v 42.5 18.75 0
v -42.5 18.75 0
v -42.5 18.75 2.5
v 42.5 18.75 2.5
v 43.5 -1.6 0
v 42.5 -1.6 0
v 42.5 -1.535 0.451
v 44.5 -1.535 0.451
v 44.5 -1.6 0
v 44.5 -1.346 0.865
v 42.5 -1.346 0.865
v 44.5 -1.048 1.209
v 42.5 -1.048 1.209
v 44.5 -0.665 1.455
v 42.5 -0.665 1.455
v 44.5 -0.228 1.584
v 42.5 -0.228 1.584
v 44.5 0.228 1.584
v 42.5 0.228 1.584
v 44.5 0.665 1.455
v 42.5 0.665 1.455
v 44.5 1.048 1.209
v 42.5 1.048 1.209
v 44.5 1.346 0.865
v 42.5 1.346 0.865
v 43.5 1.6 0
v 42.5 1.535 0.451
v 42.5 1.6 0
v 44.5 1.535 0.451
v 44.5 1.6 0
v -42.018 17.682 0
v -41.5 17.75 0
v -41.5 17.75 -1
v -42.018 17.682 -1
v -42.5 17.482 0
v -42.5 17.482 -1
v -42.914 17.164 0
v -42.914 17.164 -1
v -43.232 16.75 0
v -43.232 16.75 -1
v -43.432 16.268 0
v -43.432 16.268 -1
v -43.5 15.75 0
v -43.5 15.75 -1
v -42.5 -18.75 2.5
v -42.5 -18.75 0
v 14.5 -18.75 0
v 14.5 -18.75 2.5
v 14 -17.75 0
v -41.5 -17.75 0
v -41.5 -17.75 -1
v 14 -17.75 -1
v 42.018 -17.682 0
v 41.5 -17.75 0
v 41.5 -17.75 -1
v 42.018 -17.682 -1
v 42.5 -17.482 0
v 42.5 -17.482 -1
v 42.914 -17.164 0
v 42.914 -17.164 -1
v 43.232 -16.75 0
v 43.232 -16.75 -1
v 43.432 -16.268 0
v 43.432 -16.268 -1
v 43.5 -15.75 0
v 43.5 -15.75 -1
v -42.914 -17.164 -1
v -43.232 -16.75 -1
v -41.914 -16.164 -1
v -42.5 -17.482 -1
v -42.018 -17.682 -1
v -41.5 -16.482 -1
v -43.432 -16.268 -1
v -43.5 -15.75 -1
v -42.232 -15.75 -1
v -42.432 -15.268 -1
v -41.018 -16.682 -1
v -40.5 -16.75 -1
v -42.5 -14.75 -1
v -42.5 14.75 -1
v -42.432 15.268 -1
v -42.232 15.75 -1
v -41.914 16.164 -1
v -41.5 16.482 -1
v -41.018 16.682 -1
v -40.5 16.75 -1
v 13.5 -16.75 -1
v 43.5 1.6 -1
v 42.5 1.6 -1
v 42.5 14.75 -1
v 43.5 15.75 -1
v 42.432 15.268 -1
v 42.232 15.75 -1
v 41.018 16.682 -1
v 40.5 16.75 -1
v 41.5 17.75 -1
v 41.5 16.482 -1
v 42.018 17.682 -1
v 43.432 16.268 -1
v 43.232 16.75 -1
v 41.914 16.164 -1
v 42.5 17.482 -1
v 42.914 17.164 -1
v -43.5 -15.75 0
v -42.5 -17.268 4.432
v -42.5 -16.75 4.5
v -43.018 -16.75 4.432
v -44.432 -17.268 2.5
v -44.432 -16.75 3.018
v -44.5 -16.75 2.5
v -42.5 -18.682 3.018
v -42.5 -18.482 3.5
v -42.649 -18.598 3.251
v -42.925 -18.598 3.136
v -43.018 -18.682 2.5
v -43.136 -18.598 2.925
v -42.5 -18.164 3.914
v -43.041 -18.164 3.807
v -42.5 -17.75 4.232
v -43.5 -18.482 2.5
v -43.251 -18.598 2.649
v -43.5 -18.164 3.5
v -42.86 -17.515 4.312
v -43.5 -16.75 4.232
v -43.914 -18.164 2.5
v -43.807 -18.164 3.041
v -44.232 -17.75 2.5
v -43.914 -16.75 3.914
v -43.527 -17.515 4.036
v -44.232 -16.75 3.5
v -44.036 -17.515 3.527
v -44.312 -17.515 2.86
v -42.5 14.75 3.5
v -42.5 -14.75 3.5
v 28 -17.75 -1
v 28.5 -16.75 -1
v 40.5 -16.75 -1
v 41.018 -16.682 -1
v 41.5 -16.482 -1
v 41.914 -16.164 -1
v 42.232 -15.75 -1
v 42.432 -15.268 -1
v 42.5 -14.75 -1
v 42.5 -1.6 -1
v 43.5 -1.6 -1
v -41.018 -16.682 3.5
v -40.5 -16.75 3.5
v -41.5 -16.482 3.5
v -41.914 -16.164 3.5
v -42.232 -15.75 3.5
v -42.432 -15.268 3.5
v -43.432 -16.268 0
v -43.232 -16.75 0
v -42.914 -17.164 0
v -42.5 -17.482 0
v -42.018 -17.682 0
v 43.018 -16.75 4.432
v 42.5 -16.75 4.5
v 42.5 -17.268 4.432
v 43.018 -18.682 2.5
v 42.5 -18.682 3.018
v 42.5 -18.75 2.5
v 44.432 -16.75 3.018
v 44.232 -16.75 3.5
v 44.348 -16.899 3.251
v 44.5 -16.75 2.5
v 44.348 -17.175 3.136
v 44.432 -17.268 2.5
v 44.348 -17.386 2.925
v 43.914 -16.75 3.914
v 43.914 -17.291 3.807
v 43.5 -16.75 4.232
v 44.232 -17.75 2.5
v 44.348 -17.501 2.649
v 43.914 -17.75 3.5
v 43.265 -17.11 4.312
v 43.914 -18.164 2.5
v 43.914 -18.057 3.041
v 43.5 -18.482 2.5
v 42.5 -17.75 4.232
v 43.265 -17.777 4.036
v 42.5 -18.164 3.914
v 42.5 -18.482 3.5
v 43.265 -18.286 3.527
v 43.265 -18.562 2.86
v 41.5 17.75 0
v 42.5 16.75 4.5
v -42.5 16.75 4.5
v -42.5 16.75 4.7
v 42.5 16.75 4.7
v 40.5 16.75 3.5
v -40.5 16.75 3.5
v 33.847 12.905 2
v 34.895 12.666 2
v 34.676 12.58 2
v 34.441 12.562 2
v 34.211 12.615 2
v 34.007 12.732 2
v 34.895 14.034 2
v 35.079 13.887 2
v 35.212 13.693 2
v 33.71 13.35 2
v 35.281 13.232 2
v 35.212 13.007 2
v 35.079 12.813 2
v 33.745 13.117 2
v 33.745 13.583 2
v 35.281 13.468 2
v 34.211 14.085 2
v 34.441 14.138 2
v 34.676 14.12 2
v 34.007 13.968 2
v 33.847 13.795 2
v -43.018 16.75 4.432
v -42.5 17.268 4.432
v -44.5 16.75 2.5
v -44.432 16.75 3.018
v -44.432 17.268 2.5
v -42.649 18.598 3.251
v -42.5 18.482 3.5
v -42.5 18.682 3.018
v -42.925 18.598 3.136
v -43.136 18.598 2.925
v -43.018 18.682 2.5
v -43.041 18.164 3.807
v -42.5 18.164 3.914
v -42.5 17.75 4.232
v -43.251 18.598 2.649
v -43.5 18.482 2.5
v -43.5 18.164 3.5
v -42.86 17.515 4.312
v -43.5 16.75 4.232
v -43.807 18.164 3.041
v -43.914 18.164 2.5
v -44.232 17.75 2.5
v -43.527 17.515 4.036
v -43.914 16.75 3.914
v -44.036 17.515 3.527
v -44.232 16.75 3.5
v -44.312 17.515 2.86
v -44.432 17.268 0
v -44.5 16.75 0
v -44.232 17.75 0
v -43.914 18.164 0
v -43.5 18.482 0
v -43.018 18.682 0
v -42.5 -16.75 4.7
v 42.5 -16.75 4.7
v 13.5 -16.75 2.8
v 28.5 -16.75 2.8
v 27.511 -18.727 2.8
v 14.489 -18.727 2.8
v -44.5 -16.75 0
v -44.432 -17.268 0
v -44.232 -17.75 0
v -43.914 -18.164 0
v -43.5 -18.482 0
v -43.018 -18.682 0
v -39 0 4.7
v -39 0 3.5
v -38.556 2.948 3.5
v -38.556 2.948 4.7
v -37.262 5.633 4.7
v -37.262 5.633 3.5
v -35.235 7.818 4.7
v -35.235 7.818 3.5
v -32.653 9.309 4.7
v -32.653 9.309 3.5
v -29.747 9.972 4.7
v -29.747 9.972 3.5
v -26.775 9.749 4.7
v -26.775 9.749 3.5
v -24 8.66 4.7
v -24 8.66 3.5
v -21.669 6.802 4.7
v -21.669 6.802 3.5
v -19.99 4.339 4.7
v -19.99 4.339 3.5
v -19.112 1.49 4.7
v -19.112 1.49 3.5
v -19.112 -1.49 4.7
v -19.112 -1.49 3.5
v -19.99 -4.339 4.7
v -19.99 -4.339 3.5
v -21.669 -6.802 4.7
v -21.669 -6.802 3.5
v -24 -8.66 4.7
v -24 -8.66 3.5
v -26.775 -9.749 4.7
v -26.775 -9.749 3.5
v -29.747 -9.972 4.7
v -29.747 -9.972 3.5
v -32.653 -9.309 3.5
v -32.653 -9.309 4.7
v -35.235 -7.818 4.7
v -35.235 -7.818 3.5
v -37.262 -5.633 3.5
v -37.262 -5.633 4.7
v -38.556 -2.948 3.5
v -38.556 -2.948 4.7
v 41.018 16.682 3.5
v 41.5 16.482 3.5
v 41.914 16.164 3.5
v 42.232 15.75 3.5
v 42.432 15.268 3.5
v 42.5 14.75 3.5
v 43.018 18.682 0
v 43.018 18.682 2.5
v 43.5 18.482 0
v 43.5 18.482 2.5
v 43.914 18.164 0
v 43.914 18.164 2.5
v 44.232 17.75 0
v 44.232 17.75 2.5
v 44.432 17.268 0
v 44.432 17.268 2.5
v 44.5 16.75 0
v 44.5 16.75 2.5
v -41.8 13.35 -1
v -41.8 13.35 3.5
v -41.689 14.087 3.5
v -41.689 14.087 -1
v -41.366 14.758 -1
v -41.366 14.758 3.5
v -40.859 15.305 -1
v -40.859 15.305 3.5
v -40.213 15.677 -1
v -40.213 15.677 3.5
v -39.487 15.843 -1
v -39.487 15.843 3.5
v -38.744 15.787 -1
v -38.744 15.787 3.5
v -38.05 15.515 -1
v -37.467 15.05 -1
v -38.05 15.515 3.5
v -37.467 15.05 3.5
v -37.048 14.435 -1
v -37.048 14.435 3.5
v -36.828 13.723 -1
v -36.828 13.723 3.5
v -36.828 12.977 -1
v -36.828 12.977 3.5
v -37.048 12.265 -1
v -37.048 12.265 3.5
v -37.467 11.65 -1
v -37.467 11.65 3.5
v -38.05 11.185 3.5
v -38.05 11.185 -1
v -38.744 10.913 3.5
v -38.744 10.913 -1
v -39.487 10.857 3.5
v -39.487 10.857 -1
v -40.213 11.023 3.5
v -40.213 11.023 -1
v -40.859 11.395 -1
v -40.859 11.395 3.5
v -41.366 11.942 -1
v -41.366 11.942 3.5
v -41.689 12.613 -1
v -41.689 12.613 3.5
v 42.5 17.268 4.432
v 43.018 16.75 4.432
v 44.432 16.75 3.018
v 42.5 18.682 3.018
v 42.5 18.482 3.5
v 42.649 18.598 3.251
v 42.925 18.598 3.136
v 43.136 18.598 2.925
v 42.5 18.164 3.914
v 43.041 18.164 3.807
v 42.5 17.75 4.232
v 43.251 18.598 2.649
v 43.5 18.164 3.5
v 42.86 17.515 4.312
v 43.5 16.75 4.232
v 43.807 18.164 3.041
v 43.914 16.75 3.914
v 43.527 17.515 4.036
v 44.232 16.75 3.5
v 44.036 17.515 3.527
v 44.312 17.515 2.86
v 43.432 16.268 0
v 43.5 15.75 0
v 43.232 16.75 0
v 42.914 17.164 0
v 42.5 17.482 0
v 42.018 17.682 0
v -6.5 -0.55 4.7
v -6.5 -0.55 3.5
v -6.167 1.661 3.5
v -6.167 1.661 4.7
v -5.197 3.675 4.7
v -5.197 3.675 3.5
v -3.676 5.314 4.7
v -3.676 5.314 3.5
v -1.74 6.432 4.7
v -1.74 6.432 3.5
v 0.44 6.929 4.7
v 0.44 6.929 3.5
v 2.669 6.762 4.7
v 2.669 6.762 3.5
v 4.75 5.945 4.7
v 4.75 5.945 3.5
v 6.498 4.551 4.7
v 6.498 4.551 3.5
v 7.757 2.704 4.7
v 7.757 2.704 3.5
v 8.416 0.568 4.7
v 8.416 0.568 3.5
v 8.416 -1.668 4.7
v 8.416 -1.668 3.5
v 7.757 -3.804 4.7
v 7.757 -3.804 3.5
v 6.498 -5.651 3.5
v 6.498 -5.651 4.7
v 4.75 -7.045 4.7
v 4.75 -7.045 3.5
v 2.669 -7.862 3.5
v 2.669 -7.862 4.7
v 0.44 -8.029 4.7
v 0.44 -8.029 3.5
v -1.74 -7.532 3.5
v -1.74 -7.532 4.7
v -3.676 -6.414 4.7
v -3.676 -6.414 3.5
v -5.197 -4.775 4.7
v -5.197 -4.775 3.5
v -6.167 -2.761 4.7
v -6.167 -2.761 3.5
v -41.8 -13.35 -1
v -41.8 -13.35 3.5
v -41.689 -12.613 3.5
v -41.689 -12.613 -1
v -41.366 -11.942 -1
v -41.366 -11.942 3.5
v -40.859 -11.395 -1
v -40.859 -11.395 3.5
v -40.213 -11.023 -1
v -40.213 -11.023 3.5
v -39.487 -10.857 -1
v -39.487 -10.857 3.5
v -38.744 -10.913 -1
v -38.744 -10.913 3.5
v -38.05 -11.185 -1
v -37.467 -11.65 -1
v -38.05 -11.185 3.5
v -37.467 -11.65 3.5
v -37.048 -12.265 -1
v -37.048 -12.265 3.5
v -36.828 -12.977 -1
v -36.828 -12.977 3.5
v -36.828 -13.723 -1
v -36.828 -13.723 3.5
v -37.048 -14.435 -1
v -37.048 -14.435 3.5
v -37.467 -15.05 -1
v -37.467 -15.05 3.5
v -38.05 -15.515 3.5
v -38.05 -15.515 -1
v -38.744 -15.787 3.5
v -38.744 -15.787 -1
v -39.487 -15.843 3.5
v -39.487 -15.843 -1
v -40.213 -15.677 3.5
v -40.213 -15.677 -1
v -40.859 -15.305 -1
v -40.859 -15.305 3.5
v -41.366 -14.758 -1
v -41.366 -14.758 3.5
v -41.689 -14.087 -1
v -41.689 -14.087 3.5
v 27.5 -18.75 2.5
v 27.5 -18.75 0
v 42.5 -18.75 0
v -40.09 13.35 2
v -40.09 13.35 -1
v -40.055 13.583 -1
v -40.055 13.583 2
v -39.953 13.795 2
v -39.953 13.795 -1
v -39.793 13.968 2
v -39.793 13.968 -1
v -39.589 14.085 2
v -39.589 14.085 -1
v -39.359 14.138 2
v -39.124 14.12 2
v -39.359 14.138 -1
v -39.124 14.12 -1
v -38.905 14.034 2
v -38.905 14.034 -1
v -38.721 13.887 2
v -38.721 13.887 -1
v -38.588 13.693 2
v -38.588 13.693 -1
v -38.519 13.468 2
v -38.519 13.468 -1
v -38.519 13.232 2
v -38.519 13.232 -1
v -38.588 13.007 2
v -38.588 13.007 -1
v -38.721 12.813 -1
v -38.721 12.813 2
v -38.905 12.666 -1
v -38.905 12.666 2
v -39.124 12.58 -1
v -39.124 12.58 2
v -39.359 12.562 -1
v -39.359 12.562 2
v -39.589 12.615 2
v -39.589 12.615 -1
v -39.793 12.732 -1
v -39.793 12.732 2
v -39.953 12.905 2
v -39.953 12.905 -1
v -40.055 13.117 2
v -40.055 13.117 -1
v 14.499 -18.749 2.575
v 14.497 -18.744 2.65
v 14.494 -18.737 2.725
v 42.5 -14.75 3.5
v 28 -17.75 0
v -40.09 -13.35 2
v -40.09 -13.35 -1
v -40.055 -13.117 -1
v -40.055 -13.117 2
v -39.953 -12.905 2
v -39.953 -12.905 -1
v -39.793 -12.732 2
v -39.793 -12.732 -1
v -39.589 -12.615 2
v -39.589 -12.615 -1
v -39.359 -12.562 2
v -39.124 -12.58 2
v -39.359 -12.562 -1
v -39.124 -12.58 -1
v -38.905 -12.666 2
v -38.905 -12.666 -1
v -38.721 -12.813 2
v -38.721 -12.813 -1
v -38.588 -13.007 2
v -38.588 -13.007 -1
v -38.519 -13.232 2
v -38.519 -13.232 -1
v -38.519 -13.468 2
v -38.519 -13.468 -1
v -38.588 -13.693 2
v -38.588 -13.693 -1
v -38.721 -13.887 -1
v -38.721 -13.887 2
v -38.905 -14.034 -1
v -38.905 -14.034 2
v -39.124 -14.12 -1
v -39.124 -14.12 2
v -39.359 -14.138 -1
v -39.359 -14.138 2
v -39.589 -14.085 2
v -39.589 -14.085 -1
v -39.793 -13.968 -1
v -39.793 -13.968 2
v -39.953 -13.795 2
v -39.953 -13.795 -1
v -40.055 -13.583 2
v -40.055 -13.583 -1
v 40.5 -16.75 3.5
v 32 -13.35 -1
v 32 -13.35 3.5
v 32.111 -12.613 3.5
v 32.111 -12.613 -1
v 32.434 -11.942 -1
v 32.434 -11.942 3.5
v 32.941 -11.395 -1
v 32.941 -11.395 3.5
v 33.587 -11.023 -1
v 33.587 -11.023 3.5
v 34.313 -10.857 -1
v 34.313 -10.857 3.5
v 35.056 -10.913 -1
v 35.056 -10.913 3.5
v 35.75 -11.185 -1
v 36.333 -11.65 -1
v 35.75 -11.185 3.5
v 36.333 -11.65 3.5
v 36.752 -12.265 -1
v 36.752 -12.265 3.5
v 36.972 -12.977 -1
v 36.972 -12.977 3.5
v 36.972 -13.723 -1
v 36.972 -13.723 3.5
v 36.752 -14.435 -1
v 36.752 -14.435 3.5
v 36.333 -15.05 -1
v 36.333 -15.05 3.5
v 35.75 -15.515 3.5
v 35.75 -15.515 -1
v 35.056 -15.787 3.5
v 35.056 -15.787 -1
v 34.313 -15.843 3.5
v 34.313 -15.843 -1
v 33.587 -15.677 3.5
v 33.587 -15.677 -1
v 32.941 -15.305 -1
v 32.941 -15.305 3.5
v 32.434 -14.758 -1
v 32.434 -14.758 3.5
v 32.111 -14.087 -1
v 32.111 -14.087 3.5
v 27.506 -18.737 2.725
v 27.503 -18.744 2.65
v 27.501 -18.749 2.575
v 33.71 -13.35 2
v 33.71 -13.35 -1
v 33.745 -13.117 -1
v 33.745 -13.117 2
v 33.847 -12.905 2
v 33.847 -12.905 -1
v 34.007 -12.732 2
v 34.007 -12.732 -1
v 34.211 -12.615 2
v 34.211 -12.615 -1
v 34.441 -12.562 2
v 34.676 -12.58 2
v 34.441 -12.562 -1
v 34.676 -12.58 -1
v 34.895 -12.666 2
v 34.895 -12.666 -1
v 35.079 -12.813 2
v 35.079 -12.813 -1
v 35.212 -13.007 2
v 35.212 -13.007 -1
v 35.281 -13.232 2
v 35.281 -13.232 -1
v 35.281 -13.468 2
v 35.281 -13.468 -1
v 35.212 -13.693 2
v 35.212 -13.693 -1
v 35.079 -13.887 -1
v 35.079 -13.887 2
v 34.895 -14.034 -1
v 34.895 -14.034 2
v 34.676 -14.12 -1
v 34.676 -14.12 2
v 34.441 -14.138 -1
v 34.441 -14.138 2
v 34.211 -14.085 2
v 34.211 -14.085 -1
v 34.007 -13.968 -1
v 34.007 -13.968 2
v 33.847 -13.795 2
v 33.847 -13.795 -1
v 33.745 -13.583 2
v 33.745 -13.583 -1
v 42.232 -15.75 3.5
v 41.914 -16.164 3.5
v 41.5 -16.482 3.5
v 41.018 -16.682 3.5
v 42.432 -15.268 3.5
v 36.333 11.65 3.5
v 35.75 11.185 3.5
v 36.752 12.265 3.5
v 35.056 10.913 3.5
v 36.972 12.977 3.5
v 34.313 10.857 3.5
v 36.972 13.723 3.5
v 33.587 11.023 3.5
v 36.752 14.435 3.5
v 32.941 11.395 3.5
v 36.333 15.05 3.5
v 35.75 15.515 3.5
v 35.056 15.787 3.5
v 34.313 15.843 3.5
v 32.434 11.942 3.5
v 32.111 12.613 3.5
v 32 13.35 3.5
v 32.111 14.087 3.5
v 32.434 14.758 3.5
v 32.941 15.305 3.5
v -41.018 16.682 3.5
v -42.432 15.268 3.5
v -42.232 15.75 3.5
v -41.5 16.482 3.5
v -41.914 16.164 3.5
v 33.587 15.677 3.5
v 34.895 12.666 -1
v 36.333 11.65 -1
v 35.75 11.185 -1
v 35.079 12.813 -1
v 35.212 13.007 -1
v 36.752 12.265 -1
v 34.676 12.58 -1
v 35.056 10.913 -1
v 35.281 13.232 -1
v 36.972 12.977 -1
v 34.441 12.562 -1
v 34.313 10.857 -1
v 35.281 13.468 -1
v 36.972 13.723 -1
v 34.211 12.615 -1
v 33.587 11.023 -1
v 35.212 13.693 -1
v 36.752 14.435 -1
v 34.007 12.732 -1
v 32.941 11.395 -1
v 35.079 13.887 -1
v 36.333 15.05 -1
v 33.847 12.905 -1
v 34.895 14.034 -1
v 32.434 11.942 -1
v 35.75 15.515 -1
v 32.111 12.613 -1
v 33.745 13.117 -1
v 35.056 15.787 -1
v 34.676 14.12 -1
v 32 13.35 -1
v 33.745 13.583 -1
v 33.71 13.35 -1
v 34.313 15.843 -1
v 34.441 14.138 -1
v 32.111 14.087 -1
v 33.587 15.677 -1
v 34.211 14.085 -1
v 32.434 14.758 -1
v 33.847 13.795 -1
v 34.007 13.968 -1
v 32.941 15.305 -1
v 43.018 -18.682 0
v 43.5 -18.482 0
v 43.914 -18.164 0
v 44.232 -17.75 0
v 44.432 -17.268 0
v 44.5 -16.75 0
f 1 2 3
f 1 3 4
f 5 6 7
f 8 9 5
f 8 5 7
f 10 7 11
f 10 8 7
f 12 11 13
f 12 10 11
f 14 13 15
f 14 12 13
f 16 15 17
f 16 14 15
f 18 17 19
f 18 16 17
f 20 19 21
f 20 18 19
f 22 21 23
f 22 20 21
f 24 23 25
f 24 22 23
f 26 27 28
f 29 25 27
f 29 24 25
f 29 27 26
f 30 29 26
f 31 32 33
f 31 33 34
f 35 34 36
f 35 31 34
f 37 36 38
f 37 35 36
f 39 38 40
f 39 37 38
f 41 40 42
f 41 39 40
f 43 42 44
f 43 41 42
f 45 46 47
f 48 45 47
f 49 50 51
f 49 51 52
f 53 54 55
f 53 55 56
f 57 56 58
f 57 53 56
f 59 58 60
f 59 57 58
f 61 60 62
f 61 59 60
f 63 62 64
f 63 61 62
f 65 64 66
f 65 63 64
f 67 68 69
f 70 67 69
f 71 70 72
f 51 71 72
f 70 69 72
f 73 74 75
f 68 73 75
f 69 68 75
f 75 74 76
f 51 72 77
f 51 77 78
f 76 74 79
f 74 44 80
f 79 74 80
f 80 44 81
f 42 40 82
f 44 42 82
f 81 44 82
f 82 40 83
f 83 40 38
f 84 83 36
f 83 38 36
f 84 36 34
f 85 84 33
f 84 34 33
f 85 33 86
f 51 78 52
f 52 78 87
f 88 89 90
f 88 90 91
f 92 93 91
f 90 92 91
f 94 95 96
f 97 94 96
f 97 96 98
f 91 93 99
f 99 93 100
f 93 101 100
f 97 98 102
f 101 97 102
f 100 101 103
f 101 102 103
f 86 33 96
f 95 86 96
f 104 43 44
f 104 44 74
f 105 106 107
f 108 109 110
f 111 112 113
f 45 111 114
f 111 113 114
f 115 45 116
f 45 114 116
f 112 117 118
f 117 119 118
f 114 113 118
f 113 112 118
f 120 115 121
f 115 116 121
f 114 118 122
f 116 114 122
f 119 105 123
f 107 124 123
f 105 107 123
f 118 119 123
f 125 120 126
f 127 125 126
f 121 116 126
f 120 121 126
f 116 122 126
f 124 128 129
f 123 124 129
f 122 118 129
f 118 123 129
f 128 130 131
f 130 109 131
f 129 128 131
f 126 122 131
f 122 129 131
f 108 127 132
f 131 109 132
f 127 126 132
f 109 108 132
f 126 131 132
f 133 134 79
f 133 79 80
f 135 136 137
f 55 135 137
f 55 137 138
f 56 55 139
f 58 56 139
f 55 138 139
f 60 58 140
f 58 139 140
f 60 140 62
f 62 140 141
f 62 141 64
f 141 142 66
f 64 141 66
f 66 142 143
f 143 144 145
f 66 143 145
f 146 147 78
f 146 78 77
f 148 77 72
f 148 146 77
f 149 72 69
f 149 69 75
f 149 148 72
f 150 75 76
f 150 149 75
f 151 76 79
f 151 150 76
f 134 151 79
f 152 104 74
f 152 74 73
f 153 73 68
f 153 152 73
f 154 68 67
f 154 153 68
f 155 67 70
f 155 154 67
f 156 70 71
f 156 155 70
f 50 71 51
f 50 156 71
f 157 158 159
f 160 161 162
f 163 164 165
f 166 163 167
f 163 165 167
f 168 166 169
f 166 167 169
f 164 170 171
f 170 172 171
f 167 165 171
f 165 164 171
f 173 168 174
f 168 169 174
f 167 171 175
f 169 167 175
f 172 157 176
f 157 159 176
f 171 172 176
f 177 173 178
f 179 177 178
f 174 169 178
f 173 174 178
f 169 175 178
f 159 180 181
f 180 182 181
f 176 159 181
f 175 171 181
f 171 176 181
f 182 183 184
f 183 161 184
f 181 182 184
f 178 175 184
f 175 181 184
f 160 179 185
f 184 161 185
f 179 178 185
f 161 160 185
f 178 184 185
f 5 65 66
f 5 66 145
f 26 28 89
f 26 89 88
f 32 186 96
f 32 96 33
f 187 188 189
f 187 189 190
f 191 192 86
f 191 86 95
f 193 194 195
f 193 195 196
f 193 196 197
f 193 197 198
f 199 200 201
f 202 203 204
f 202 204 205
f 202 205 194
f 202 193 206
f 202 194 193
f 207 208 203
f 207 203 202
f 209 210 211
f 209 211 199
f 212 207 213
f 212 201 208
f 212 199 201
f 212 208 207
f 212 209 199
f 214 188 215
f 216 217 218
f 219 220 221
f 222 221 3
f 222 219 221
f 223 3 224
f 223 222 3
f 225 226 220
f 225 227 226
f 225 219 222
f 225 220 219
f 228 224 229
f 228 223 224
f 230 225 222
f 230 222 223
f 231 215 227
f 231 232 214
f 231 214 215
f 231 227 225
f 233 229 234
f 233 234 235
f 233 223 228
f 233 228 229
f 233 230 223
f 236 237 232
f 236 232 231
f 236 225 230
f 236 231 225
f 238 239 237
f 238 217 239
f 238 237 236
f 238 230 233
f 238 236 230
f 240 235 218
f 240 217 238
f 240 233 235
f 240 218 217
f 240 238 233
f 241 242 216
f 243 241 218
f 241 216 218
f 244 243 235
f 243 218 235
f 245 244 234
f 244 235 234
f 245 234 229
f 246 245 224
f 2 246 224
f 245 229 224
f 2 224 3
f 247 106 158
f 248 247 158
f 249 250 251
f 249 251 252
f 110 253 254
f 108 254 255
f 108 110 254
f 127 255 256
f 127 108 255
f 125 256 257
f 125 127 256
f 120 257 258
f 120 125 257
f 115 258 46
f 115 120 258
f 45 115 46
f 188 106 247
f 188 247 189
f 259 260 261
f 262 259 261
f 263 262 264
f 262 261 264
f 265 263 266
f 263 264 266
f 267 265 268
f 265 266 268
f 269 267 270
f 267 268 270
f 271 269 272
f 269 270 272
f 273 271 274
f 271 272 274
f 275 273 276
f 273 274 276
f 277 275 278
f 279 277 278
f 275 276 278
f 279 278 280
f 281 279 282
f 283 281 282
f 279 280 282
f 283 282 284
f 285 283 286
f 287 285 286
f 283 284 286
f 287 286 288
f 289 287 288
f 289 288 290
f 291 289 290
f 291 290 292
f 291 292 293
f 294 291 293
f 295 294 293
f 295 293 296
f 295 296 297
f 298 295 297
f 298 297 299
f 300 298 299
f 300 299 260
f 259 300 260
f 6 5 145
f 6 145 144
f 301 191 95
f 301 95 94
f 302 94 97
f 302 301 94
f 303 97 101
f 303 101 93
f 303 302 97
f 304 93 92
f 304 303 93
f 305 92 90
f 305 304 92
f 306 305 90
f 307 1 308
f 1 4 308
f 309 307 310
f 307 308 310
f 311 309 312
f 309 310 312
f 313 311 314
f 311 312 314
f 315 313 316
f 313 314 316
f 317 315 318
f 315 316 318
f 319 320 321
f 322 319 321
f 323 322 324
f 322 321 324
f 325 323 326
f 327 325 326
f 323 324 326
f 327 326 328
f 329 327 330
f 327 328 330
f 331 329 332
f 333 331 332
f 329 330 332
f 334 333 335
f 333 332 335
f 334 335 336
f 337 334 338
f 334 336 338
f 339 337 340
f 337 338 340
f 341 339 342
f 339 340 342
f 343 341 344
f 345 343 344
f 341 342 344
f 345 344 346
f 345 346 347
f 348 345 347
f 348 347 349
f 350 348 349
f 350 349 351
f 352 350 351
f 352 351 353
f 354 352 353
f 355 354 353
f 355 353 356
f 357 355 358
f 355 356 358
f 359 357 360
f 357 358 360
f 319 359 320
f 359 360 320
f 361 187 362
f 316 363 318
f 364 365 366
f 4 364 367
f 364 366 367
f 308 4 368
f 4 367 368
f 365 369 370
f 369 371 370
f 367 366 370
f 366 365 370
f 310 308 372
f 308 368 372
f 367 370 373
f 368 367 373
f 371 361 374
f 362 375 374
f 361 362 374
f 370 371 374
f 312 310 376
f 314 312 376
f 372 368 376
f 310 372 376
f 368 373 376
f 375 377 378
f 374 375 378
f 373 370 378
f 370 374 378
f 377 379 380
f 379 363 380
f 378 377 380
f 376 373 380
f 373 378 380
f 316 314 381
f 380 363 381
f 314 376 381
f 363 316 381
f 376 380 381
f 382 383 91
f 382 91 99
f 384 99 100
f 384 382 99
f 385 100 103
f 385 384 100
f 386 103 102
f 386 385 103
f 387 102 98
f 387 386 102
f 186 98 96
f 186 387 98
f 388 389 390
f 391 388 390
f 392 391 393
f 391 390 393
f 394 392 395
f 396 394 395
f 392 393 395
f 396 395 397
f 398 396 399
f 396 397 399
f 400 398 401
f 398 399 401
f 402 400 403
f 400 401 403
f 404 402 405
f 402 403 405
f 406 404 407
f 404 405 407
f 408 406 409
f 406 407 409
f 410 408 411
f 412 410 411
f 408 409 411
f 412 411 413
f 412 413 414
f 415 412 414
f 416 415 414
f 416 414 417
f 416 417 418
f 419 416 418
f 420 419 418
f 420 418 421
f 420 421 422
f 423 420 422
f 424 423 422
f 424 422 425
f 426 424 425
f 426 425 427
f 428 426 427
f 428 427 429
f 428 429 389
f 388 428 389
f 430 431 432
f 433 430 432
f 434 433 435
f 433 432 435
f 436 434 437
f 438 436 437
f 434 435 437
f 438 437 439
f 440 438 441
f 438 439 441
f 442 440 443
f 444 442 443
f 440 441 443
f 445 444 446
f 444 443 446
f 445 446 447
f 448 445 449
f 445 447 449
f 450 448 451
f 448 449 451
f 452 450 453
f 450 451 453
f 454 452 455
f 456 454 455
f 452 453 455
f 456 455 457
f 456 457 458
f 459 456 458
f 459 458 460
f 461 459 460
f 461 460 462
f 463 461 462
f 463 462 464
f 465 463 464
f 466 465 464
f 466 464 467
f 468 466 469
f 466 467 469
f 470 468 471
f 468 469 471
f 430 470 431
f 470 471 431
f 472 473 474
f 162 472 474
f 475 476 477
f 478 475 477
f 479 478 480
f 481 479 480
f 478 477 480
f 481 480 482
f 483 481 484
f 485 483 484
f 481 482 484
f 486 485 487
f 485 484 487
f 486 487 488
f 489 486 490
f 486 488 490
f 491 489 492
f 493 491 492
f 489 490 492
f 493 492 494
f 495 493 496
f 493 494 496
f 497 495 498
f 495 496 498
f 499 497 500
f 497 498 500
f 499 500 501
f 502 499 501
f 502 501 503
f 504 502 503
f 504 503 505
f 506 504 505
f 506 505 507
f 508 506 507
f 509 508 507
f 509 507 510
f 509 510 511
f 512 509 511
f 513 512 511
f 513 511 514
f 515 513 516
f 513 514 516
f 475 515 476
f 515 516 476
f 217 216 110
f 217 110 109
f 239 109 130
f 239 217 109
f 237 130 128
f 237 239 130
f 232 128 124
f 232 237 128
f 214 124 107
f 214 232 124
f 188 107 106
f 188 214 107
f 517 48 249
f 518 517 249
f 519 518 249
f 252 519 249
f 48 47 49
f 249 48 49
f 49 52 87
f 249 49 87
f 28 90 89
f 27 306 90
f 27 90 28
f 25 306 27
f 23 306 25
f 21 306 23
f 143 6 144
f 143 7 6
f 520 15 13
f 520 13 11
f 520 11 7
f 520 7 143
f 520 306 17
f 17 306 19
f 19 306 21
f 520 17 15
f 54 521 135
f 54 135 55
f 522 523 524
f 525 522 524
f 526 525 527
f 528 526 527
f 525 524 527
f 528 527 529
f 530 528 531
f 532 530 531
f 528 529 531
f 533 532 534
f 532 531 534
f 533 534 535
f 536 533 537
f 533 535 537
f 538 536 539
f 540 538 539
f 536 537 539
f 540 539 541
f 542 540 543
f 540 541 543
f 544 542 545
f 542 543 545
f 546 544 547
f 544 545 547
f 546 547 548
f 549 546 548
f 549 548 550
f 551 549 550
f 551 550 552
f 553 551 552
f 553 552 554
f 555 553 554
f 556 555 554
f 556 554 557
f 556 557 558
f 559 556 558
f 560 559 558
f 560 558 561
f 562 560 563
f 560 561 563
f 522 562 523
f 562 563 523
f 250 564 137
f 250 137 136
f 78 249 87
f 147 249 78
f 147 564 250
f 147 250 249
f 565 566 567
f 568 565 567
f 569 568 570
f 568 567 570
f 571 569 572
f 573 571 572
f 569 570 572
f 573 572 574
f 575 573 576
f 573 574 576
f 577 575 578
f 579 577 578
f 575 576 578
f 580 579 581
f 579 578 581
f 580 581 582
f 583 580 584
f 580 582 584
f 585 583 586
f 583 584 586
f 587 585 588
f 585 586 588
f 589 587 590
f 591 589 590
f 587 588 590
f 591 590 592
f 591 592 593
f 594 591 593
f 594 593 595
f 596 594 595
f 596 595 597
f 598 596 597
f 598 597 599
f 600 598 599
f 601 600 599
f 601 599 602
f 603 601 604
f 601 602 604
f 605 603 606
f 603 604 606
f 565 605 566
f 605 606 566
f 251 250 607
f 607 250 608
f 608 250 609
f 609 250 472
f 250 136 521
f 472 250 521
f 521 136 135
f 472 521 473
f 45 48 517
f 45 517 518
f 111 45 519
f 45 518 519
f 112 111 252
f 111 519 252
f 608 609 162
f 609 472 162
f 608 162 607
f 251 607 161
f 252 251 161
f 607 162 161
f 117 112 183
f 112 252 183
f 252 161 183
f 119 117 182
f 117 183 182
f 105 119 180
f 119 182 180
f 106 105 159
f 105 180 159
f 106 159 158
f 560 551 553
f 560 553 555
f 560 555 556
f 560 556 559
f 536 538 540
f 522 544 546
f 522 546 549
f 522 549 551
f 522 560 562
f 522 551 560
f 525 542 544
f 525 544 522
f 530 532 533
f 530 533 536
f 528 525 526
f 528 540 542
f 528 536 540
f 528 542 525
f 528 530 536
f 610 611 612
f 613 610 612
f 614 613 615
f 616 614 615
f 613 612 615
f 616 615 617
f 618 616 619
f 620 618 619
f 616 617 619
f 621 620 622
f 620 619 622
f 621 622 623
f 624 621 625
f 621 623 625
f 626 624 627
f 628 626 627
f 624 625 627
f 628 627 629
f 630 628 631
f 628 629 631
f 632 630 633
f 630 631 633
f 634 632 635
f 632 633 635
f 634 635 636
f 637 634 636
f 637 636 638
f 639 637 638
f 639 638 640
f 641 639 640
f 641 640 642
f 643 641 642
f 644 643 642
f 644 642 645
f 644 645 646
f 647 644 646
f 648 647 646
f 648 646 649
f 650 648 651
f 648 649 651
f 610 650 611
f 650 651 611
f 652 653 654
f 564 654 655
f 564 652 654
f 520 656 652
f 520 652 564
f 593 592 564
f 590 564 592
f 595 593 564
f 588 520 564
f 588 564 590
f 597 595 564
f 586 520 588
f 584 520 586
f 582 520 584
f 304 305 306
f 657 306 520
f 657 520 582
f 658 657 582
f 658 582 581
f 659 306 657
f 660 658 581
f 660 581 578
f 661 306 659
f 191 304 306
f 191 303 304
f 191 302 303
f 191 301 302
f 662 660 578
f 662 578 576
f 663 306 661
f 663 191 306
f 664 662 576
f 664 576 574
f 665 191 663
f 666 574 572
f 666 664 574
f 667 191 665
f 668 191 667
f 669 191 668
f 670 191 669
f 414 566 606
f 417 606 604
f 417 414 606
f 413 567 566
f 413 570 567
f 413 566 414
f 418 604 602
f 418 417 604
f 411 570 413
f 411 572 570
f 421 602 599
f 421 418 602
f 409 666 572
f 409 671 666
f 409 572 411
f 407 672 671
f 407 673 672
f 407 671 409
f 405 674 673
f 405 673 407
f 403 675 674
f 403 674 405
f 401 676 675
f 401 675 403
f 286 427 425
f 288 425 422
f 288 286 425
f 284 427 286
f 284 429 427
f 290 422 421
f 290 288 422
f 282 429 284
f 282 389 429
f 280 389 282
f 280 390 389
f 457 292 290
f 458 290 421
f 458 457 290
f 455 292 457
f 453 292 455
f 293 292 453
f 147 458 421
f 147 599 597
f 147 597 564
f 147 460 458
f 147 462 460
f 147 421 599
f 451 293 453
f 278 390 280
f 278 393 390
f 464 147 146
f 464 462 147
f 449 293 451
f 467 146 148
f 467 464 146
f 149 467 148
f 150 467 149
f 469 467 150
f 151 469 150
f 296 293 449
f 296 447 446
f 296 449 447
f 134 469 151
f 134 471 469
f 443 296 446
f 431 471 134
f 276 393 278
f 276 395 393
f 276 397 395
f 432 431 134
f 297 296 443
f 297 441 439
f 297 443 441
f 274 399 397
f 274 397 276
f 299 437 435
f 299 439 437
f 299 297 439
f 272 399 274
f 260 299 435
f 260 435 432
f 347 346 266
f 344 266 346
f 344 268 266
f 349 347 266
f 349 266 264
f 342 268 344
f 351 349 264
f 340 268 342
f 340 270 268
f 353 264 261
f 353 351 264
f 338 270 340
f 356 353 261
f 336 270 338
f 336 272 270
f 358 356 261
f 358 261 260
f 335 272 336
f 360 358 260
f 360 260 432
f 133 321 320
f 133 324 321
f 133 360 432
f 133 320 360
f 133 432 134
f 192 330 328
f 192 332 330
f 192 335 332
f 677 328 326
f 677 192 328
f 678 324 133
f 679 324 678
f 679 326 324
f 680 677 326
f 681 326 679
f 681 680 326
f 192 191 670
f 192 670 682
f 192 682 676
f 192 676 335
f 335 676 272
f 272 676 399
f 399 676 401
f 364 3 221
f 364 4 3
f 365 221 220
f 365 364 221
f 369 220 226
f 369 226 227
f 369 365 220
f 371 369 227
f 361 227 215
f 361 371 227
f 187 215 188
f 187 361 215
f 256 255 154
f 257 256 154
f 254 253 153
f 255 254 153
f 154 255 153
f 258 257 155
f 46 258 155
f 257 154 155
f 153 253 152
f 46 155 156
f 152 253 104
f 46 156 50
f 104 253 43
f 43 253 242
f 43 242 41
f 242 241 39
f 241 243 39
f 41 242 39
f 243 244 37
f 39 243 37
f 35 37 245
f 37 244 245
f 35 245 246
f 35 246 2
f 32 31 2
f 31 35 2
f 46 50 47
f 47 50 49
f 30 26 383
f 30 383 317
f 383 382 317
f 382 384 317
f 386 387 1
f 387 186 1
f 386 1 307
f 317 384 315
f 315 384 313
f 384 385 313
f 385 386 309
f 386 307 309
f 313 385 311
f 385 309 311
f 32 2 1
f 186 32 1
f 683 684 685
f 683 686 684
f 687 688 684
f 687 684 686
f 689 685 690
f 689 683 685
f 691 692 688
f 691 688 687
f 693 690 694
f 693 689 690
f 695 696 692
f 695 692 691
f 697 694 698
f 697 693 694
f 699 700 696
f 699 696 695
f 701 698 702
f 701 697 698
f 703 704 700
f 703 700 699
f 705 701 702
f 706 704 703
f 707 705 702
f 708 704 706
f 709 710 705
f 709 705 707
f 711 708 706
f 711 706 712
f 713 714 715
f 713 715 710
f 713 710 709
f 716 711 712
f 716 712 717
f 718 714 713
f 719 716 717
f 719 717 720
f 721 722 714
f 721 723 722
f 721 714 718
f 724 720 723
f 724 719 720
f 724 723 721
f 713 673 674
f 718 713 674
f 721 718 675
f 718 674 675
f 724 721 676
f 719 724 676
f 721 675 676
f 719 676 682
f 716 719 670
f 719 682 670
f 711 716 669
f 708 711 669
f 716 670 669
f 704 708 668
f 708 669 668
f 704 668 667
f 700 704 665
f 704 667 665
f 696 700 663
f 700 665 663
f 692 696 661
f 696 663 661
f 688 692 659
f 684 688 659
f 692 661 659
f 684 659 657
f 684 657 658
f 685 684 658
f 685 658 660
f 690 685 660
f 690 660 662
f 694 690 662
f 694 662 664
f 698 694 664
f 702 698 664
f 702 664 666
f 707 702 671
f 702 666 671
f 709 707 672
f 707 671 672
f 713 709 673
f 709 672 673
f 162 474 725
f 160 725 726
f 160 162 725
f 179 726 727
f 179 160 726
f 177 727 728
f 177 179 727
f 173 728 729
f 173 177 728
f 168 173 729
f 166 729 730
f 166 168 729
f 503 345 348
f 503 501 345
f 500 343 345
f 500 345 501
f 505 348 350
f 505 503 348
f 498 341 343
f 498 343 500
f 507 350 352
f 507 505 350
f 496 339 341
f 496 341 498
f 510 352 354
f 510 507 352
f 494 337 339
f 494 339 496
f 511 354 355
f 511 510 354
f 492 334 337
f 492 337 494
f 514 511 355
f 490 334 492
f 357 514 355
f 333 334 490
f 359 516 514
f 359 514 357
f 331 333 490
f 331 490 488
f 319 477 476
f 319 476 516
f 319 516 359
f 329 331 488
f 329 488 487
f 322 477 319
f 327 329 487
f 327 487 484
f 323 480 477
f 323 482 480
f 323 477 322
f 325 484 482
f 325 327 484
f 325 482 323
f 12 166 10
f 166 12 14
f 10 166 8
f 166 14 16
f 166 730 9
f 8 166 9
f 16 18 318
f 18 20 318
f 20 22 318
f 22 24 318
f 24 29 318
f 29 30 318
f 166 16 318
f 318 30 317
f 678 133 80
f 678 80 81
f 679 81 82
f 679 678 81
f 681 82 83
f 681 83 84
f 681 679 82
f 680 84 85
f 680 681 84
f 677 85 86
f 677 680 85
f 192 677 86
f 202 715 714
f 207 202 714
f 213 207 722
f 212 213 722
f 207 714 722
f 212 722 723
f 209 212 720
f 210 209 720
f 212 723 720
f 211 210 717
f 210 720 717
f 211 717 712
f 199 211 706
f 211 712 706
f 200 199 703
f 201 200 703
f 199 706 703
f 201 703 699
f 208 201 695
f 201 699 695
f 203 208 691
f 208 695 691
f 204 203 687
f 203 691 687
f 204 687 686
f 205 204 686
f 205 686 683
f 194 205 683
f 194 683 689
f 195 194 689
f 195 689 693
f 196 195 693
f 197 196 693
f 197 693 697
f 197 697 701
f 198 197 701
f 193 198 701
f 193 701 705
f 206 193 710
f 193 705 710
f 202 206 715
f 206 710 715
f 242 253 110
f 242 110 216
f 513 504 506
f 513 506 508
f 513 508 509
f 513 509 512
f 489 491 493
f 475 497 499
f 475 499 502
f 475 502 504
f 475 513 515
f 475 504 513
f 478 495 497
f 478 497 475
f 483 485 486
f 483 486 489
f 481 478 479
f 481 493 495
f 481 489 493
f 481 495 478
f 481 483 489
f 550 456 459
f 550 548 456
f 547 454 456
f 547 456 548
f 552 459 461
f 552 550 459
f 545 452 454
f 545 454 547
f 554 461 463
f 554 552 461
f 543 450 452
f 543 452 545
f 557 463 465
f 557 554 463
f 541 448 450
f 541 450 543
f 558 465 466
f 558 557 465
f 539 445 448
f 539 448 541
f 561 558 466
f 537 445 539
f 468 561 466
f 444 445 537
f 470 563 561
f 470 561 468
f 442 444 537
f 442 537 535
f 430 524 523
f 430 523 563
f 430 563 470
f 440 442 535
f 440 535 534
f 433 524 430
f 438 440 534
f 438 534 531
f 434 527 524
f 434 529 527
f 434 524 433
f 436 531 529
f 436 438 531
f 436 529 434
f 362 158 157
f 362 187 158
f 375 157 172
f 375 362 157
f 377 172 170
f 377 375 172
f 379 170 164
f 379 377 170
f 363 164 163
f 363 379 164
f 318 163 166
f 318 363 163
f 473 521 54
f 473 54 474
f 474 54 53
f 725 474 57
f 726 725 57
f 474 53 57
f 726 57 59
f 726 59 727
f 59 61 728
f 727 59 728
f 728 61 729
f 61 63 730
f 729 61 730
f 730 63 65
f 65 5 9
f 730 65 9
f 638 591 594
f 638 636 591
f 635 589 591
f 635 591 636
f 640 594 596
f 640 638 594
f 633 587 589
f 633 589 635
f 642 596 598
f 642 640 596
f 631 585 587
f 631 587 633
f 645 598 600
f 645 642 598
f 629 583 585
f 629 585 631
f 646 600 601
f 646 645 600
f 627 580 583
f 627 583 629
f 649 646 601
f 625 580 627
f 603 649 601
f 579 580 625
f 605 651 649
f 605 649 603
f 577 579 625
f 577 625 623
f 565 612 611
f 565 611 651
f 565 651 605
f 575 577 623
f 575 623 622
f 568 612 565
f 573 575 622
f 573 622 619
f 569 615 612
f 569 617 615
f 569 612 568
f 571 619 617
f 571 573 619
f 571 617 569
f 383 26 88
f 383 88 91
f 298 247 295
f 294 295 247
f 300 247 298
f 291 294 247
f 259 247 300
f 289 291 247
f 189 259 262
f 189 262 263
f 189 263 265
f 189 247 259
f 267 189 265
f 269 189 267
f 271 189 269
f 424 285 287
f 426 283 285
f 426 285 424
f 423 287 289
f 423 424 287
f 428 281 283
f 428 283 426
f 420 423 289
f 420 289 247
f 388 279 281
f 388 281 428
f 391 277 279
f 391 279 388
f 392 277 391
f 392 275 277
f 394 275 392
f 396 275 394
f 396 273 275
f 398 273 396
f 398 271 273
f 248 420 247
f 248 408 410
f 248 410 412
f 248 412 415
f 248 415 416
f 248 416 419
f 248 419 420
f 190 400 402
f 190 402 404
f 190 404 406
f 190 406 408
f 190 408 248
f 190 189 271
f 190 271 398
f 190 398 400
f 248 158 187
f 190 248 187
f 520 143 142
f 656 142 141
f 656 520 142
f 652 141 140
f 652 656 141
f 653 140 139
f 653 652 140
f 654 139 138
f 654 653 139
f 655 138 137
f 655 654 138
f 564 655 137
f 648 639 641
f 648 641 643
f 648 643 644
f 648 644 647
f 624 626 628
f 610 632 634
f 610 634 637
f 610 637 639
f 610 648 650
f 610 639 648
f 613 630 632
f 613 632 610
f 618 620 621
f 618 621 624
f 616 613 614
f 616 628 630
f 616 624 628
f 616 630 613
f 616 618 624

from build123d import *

# Parameters (mm, degrees)
SKETCH_1_W           = 89
SKETCH_1_H           = 37.5
EXTRUDE_1_DEPTH      = 4.5
SKETCH_2_W           = 85
SKETCH_2_H           = 33.5
CUT_EXTRUDE_1_DEPTH  = 3.5
CUT_EXTRUDE_3_DEPTH  = 4
FILLET_1_R           = 2
EXTRUDE_2_DEPTH      = 1
SKETCH_10_R          = 2.5
EXTRUDE_3_DEPTH      = 4.5
SKETCH_11_R          = 0.79
CUT_EXTRUDE_9_DEPTH  = 3
SKETCH_12_W          = 85
SKETCH_12_H          = 33.5
EXTRUDE_4_DEPTH      = 0.2
SKETCH_8_R           = 7.5
CUT_EXTRUDE_8_DEPTH  = 3
SKETCH_7_R           = 10
CUT_EXTRUDE_7_DEPTH  = 3
CUT_EXTRUDE_12_DEPTH = 3.8


with BuildPart() as part:
    # 草图1 → 凸台-拉伸1 (new body)
    with BuildSketch(Plane.XY):
        Rectangle(SKETCH_1_W, SKETCH_1_H)
    extrude(amount=EXTRUDE_1_DEPTH)

    # 草图2 → 切除-拉伸1 (cut)
    with BuildSketch(Plane(origin=(0, 0, 0), x_dir=(-1, 0, 0), z_dir=(0, 0, -1))):
        Rectangle(SKETCH_2_W, SKETCH_2_H)
    extrude(amount=-CUT_EXTRUDE_1_DEPTH, mode=Mode.SUBTRACT)

    # 草图3 → 切除-拉伸3 (cut)
    with BuildSketch(Plane(origin=(44.5, 0, 0), x_dir=(0, 0, -1), z_dir=(1, 0, 0))):
        with BuildLine():
            Line((0, 1.6), (0, -1.6))
            ThreePointArc((0, -1.6), (-1.6, 0), (0, 1.6))
        make_face()
    extrude(amount=-CUT_EXTRUDE_3_DEPTH, mode=Mode.SUBTRACT)

    # 圆角1
    fillet_1_edges = [part.edges().sort_by_distance(p)[0] for p in [
        (-44.5, 0, 4.5),
        (0, -18.75, 4.5),
        (42.5, -16.75, 1.75),
        (42.5, 16.75, 1.75),
        (-42.5, 16.75, 1.75),
        (-42.5, -16.75, 1.75),
        (44.5, 0, 4.5),
        (0, 18.75, 4.5),
        (44.5, -18.75, 2.25),
        (-44.5, -18.75, 2.25),
        (-44.5, 18.75, 2.25),
        (44.5, 18.75, 2.25),
    ]]
    fillet(fillet_1_edges, radius=FILLET_1_R)

    # 草图9 → 凸台-拉伸2 (add)
    with BuildSketch(Plane(origin=(0, 0, 0), x_dir=(-1, 0, 0), z_dir=(0, 0, -1))):
        with BuildLine():
            Line((-41.5, 17.75), (41.5, 17.75))
            ThreePointArc((41.5, 17.75), (42.914213562, 17.164213562), (43.5, 15.75))
            Line((43.5, 15.75), (43.5, -15.75))
            ThreePointArc((43.5, -15.75), (42.914213562, -17.164213562), (41.5, -17.75))
            Line((41.5, -17.75), (-41.5, -17.75))
            ThreePointArc((-41.5, -17.75), (-42.914213562, -17.164213562), (-43.5, -15.75))
            Line((-43.5, -15.75), (-43.5, -1.6))
            Line((-43.5, -1.6), (-42.5, -1.6))
            Line((-42.5, -1.6), (-42.5, -14.75))
            ThreePointArc((-42.5, -14.75), (-41.914213562, -16.164213562), (-40.5, -16.75))
            Line((-40.5, -16.75), (40.5, -16.75))
            ThreePointArc((40.5, -16.75), (41.914213562, -16.164213562), (42.5, -14.75))
            Line((42.5, -14.75), (42.5, 14.75))
            ThreePointArc((42.5, 14.75), (41.914213562, 16.164213562), (40.5, 16.75))
            Line((40.5, 16.75), (-40.5, 16.75))
            ThreePointArc((-40.5, 16.75), (-41.914213562, 16.164213562), (-42.5, 14.75))
            Line((-42.5, 14.75), (-42.5, 1.6))
            Line((-42.5, 1.6), (-43.5, 1.6))
            Line((-43.5, 1.6), (-43.5, 15.75))
            ThreePointArc((-43.5, 15.75), (-42.914213562, 17.164213562), (-41.5, 17.75))
        make_face()
    extrude(amount=EXTRUDE_2_DEPTH)

    # 草图10 → 凸台-拉伸3 (add)
    with BuildSketch(Plane(origin=(0, 0, 3.5), x_dir=(-1, 0, 0), z_dir=(0, 0, -1))):
        with Locations((39.3, -13.35)):
            Circle(SKETCH_10_R)
        with Locations((39.3, 13.35)):
            Circle(SKETCH_10_R)
        with Locations((-34.5, 13.35)):
            Circle(SKETCH_10_R)
        with Locations((-34.5, -13.35)):
            Circle(SKETCH_10_R)
    extrude(amount=EXTRUDE_3_DEPTH)

    # 草图11 → 切除-拉伸9 (cut)
    with BuildSketch(Plane(origin=(0, 0, -1), x_dir=(-1, 0, 0), z_dir=(0, 0, -1))):
        with Locations((-34.5, 13.35)):
            Circle(SKETCH_11_R)
        with Locations((-34.5, -13.35)):
            Circle(SKETCH_11_R)
        with Locations((39.3, 13.35)):
            Circle(SKETCH_11_R)
        with Locations((39.3, -13.35)):
            Circle(SKETCH_11_R)
    extrude(amount=-CUT_EXTRUDE_9_DEPTH, mode=Mode.SUBTRACT)

    # 草图12 → 凸台-拉伸4 (add)
    with BuildSketch(Plane.XY.offset(4.5)):
        Rectangle(SKETCH_12_W, SKETCH_12_H)
    extrude(amount=EXTRUDE_4_DEPTH)

    # 草图8 → 切除-拉伸8 (cut)
    with BuildSketch(Plane(origin=(0, 0, 3.5), x_dir=(-1, 0, 0), z_dir=(0, 0, -1))):
        with Locations((-1, -0.55)):
            Circle(SKETCH_8_R)
    extrude(amount=-CUT_EXTRUDE_8_DEPTH, mode=Mode.SUBTRACT)

    # 草图7 → 切除-拉伸7 (cut)
    with BuildSketch(Plane(origin=(0, 0, 3.5), x_dir=(-1, 0, 0), z_dir=(0, 0, -1))):
        with Locations((29, 0)):
            Circle(SKETCH_7_R)
    extrude(amount=-CUT_EXTRUDE_7_DEPTH, mode=Mode.SUBTRACT)

    # 草图15 → 切除-拉伸12 (cut)
    with BuildSketch(Plane(origin=(0, 0, -1), x_dir=(-1, 0, 0), z_dir=(0, 0, -1))):
        Polygon((-27.5, -18.75), (-14.5, -18.75), (-13.5, -16.75), (-28.5, -16.75), align=None)
    extrude(amount=-CUT_EXTRUDE_12_DEPTH, mode=Mode.SUBTRACT)


solid = part.part
